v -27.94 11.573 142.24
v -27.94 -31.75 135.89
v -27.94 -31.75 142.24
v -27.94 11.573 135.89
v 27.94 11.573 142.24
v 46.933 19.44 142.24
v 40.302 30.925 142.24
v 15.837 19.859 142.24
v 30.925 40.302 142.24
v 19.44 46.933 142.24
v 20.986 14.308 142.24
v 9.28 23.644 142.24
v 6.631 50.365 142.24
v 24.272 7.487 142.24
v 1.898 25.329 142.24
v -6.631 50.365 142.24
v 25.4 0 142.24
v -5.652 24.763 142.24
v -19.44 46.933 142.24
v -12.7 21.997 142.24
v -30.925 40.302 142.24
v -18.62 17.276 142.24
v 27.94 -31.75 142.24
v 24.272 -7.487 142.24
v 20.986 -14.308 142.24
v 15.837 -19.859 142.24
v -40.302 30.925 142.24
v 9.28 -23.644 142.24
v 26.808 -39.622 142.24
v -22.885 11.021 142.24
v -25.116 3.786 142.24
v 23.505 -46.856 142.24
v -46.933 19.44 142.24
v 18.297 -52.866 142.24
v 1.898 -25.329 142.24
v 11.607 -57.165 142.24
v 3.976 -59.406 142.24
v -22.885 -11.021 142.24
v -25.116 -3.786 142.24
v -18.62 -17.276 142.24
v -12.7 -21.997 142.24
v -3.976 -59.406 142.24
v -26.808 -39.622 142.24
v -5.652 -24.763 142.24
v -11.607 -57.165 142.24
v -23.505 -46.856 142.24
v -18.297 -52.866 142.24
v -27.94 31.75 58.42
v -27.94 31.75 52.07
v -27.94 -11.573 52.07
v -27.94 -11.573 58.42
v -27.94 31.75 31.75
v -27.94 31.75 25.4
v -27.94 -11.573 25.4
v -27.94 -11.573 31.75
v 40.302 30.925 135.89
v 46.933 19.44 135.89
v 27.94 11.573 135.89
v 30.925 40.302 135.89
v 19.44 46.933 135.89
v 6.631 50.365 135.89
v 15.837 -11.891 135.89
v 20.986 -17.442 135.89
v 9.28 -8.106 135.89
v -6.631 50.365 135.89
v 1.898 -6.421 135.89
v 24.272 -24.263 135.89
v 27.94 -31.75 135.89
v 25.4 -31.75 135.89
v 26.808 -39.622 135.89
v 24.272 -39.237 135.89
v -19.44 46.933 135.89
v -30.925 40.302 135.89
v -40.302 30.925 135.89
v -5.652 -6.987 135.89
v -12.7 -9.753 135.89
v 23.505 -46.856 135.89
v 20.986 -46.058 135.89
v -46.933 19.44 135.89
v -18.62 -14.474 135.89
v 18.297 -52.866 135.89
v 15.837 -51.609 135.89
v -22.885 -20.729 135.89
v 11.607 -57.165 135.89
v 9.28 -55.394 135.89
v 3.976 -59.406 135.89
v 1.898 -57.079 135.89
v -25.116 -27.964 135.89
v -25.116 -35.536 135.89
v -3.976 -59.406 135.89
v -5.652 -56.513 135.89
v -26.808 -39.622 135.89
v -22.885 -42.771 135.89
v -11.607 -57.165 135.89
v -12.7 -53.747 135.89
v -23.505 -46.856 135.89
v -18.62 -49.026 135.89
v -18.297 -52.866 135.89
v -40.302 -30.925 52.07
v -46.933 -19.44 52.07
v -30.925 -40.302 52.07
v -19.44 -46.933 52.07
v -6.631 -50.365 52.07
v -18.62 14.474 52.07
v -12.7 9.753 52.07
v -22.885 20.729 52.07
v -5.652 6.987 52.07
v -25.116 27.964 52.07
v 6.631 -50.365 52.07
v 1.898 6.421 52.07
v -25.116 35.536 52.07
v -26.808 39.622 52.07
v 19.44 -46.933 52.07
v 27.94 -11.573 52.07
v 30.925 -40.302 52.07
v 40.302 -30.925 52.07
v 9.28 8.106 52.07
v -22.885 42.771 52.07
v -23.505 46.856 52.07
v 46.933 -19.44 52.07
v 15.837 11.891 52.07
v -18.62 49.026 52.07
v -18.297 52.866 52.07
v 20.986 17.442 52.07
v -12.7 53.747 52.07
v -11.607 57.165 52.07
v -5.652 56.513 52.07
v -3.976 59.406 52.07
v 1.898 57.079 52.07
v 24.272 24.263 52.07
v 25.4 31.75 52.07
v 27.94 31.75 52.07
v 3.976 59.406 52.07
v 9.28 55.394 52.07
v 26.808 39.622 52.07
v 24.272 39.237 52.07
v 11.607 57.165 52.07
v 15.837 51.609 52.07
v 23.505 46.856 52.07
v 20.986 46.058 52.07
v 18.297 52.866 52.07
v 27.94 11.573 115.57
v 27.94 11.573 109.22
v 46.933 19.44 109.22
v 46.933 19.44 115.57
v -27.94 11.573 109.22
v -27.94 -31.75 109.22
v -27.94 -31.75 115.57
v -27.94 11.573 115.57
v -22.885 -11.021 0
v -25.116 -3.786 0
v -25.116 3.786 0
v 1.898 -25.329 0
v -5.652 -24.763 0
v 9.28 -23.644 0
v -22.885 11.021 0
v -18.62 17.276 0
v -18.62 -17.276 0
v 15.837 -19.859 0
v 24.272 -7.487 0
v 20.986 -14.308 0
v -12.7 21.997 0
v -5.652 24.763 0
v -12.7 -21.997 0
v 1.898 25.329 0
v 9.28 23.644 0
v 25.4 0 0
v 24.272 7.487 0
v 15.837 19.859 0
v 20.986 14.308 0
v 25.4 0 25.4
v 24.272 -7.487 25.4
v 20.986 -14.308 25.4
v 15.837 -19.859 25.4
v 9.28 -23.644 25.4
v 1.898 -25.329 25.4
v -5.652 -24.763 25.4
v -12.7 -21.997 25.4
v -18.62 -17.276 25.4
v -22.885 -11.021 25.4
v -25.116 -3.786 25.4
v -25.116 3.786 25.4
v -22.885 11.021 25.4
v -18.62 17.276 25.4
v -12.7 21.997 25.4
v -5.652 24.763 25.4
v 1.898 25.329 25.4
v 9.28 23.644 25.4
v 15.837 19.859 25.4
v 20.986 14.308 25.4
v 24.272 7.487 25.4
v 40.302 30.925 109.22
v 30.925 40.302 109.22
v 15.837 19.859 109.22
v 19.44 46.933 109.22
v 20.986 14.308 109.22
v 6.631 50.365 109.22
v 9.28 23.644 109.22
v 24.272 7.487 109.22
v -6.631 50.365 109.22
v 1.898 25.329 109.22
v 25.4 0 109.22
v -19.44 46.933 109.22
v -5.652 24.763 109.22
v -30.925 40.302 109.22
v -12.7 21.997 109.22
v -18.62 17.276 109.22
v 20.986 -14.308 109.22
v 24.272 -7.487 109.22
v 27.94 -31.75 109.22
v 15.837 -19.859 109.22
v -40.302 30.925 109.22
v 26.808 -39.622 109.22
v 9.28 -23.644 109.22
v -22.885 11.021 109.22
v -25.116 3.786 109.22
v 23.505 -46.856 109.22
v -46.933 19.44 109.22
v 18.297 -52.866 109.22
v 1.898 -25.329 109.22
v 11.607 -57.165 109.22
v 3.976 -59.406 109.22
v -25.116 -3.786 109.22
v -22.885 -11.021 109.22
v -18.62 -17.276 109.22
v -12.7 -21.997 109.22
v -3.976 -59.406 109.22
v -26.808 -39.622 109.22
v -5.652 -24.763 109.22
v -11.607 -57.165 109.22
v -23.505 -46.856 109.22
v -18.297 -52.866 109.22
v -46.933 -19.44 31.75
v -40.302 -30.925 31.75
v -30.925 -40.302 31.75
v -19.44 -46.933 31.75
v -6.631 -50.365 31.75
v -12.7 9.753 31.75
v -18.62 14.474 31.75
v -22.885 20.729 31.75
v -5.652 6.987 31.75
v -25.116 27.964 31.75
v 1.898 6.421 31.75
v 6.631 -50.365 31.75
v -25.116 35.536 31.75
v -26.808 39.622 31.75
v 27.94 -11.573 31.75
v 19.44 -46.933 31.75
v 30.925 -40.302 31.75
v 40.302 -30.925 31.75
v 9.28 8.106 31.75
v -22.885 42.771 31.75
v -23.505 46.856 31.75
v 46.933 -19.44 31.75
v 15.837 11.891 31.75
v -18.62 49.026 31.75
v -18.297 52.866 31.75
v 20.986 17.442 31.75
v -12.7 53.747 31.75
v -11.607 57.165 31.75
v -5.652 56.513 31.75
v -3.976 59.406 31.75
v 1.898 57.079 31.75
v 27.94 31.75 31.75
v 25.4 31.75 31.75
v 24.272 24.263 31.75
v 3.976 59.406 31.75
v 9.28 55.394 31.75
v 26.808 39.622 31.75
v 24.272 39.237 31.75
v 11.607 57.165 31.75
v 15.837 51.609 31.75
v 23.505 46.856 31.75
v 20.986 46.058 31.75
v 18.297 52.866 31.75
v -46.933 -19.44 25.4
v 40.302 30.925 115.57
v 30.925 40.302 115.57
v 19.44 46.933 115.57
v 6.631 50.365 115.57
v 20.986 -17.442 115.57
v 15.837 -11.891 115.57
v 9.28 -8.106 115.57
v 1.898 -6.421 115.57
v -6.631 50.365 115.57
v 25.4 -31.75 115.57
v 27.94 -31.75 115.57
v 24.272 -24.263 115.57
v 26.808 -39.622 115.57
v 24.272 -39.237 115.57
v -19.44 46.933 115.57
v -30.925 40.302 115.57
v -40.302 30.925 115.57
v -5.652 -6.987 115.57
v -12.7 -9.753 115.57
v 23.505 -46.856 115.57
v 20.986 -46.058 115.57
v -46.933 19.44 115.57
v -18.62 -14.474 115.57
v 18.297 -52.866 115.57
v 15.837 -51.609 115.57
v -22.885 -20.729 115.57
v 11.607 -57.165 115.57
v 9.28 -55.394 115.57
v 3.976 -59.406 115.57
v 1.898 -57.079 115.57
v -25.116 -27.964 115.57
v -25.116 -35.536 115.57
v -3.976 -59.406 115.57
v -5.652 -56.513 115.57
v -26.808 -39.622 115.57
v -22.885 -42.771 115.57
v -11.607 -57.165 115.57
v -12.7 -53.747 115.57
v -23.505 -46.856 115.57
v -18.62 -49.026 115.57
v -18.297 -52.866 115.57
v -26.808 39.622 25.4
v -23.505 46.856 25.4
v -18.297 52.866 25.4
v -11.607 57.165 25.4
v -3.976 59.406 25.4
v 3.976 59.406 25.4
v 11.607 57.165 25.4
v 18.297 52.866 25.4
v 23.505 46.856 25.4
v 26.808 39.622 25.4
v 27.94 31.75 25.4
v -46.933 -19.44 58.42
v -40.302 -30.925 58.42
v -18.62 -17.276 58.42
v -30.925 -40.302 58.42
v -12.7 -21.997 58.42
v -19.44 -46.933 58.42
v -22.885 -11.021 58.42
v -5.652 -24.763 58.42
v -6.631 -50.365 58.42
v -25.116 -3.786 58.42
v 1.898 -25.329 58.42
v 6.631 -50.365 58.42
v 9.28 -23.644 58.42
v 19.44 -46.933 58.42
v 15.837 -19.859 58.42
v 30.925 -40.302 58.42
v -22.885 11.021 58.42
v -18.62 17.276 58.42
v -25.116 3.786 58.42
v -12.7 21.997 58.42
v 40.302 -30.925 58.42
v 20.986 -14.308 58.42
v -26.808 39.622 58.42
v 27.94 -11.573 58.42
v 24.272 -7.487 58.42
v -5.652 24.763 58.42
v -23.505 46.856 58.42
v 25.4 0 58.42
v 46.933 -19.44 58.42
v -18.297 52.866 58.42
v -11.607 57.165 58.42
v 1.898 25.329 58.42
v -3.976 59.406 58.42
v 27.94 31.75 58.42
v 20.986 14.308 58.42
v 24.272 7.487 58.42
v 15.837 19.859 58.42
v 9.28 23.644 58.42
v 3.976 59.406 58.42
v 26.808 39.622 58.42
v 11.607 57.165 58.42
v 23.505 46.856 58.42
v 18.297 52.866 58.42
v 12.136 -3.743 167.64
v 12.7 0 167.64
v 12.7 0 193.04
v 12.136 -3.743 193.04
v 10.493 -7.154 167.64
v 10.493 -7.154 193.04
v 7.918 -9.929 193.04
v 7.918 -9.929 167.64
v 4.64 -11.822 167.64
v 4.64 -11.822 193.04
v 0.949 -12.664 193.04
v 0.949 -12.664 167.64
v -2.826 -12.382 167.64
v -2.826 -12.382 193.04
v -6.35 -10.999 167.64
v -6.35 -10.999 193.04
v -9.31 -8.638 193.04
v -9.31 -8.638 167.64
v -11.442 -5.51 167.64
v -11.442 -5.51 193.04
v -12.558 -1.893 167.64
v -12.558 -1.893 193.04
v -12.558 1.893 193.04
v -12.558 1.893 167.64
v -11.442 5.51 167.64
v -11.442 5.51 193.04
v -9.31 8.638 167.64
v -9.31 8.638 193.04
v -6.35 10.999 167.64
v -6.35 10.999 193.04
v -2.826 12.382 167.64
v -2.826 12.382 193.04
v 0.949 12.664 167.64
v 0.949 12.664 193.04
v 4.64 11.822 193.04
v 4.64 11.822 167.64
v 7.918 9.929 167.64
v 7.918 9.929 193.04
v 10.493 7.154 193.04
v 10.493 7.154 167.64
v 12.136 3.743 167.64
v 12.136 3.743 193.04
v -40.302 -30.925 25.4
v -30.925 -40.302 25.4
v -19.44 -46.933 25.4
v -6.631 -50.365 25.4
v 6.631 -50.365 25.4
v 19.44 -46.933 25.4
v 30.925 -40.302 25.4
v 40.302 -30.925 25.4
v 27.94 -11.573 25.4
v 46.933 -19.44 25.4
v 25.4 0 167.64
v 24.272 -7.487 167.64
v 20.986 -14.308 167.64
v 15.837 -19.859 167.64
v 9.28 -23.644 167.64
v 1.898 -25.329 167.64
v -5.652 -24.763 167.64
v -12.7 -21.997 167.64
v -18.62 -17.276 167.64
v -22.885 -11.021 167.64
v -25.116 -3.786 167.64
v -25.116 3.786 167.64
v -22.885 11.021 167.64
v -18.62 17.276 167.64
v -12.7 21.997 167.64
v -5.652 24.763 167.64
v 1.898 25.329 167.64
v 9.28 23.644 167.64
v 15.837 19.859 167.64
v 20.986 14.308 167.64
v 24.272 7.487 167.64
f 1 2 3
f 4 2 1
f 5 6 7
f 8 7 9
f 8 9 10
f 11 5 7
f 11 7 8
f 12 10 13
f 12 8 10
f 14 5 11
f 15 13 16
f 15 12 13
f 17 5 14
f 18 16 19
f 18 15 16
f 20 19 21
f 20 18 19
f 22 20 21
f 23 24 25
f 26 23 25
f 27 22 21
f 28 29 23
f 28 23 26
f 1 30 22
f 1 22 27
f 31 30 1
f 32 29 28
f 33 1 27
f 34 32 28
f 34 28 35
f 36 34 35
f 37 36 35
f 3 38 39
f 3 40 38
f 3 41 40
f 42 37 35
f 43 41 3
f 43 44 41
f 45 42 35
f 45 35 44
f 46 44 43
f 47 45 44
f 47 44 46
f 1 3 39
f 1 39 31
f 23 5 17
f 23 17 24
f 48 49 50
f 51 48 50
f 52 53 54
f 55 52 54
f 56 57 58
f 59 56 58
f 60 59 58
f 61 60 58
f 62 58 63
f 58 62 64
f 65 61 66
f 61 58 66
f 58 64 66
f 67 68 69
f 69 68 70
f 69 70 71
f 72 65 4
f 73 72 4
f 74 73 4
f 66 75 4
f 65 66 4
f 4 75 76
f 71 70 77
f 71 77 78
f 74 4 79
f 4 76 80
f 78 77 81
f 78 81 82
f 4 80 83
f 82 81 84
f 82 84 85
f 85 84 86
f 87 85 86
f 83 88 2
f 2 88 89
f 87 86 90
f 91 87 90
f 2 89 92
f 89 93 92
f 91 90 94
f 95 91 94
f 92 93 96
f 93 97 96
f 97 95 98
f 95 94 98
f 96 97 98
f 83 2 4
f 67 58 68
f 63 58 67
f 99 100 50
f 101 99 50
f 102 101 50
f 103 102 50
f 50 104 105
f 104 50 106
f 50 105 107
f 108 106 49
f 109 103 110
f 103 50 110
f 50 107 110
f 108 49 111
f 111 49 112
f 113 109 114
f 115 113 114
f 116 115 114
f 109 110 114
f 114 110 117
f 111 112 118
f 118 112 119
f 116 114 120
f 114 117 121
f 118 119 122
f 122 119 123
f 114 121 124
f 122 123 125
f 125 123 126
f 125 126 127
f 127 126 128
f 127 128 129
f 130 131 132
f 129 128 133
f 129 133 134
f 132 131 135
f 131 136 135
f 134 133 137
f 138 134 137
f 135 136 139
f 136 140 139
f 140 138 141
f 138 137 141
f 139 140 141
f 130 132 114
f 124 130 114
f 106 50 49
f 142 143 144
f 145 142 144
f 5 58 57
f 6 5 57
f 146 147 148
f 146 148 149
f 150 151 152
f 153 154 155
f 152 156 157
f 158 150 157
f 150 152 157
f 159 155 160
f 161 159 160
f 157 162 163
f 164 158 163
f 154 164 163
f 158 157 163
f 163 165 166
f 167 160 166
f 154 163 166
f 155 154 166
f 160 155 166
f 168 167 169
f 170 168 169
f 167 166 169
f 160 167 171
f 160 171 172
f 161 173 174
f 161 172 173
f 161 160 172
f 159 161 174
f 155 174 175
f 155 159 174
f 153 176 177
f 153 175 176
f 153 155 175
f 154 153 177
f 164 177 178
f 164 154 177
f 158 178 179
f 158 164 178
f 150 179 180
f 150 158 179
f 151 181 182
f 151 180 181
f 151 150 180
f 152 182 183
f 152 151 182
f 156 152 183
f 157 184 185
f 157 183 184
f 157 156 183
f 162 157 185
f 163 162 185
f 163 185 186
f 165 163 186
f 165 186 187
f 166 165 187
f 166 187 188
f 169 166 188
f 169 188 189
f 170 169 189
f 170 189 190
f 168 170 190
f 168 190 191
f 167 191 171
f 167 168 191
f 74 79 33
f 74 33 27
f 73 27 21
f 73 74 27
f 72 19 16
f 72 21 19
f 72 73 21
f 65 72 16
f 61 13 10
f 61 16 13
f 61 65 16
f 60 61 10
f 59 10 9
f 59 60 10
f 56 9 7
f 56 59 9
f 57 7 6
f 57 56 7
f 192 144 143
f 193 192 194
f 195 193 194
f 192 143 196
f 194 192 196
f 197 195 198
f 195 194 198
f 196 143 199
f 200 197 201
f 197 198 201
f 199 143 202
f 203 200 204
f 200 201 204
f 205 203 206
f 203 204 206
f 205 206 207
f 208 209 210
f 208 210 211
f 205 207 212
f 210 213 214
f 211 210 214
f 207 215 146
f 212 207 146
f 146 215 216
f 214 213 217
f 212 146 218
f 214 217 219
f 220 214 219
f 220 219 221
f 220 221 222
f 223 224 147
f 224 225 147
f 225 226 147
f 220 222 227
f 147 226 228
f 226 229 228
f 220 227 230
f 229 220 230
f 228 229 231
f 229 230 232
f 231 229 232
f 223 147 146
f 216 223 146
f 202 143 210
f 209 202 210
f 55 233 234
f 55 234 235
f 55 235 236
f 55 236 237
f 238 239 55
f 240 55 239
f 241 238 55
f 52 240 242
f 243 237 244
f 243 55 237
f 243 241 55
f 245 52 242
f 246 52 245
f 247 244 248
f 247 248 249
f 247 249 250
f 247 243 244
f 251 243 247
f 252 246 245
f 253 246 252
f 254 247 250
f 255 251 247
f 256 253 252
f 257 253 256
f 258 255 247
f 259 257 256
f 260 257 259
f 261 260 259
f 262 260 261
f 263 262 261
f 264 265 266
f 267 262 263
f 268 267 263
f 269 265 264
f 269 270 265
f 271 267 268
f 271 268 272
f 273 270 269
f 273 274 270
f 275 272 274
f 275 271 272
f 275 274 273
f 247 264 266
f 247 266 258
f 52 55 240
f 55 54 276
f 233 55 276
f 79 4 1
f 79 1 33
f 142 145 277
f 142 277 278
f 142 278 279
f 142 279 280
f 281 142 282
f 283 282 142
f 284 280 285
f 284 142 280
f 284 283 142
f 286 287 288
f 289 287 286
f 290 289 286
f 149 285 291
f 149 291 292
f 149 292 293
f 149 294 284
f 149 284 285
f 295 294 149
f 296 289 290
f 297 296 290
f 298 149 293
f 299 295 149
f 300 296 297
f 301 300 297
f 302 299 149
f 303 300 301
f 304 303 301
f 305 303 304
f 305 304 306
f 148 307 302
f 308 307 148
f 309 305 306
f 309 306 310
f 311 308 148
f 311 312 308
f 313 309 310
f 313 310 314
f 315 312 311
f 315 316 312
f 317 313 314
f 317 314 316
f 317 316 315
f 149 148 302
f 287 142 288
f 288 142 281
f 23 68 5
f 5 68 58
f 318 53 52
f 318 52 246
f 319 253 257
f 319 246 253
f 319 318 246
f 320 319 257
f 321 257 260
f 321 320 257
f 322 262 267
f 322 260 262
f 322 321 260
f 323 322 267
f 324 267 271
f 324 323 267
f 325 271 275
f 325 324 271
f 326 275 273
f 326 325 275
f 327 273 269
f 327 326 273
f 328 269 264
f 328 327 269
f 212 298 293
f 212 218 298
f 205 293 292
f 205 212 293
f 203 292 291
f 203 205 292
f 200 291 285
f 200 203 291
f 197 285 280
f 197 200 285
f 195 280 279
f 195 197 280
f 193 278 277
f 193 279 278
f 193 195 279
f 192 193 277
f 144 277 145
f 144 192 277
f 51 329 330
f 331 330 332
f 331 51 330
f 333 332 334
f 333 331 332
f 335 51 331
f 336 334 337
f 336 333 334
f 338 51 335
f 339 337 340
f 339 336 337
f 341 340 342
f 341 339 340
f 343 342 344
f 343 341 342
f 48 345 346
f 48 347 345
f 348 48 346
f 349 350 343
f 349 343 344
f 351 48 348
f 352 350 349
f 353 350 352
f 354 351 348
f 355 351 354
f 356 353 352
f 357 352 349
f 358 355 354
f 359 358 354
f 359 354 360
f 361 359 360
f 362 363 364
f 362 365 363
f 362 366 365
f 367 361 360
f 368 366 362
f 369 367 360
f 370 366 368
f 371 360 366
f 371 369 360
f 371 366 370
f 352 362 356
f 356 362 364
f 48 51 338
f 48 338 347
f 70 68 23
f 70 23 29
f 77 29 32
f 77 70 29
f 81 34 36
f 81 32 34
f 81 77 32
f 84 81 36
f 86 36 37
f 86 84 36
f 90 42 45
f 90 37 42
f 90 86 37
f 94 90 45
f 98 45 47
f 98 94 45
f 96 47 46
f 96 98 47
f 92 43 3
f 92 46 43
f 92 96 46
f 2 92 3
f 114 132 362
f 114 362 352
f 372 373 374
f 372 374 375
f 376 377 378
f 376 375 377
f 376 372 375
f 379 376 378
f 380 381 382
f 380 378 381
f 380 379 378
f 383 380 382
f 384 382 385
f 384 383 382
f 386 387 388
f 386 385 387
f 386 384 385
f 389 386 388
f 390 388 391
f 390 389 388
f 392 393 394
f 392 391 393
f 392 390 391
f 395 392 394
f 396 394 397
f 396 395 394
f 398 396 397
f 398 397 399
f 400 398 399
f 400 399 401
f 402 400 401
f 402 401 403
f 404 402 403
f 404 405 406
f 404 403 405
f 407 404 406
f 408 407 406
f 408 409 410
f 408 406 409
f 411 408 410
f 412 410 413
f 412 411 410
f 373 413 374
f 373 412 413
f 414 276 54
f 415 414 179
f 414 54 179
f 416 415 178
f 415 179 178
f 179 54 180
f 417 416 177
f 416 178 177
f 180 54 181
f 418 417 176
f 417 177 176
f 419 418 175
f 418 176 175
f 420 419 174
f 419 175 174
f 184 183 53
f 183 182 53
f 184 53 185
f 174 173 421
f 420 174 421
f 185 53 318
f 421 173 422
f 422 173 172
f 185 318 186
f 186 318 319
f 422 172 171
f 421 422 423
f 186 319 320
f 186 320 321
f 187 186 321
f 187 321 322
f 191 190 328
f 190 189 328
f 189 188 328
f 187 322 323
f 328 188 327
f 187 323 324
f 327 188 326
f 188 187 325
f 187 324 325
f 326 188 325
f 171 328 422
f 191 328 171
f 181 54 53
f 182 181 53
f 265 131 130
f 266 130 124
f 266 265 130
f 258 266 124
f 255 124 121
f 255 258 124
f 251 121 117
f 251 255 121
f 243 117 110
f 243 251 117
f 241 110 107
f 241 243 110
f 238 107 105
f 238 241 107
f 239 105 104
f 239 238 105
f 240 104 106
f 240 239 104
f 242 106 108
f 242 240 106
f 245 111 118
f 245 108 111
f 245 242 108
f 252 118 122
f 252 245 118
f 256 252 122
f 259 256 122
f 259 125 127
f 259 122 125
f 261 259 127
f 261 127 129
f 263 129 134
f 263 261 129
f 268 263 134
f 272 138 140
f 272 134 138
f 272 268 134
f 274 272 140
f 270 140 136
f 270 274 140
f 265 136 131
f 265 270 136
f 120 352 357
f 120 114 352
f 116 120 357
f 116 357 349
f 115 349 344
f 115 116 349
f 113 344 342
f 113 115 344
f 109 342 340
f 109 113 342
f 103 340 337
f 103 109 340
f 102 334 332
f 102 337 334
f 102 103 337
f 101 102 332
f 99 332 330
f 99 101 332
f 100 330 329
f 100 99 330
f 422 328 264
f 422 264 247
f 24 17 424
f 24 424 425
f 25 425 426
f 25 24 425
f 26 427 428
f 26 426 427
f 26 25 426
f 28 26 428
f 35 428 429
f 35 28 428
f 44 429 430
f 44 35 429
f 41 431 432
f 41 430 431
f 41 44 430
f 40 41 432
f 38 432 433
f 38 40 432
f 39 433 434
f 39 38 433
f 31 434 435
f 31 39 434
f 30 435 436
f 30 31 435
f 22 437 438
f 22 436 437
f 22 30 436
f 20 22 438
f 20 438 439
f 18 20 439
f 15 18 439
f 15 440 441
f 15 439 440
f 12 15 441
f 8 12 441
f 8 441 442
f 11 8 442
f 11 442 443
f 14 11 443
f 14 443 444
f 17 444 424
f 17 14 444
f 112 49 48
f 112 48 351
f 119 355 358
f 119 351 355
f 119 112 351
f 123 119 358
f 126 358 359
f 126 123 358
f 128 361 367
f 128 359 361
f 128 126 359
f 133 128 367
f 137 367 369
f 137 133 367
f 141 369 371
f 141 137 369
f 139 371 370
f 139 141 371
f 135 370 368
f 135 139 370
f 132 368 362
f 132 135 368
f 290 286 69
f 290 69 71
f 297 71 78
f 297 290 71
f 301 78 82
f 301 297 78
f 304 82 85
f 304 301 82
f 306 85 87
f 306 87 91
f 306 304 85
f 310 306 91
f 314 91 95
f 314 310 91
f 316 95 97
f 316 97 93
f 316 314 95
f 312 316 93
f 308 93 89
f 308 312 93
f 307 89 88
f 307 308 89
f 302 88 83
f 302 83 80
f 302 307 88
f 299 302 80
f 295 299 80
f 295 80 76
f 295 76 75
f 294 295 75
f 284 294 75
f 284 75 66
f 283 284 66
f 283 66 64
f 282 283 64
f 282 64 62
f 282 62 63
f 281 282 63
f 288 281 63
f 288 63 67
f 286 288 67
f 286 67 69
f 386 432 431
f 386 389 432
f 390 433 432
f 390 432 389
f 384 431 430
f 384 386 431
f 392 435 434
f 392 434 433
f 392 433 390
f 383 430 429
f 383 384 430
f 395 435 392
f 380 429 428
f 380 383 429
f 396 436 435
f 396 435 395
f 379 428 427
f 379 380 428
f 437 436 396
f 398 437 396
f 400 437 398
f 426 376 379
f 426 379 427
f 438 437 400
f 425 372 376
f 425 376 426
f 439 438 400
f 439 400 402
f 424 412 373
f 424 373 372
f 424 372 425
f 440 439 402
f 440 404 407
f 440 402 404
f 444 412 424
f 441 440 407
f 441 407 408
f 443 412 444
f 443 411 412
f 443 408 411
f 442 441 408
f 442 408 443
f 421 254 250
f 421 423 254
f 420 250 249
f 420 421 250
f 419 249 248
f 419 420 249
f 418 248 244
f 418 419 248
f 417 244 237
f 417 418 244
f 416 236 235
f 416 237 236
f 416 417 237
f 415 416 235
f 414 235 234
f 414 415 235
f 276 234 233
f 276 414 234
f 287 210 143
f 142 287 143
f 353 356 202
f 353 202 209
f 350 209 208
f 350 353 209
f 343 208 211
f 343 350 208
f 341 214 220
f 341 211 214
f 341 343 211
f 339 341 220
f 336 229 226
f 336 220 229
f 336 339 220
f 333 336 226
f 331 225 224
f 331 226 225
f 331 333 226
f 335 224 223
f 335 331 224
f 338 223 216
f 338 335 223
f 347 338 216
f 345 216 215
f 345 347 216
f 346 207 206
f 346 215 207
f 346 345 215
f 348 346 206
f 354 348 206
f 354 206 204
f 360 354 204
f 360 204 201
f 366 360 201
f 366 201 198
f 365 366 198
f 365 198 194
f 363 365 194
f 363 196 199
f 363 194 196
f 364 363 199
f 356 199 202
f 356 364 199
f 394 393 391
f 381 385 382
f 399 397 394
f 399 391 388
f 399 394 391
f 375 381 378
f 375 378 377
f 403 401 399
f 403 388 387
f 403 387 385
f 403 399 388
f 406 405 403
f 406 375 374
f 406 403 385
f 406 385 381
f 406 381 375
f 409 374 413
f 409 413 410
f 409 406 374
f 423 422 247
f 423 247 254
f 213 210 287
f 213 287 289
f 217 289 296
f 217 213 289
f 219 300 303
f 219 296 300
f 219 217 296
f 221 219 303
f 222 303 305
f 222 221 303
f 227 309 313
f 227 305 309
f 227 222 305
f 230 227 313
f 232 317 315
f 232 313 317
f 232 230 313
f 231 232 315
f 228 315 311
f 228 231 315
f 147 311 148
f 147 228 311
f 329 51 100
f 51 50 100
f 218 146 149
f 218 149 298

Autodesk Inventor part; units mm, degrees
ref_plane "YZ Plane" through (0, 0, 0) normal (1, 0, 0) x (0, 1, 0)
ref_plane "XZ Plane" through (0, 0, 0) normal (0, 1, 0) x (-1, 0, 0)
ref_plane "XY Plane" through (0, 0, 0) normal (0, 0, 1) x (1, 0, 0)
sketch "Sketch1" plane through (0, 0, 0) normal (0, 0, 1) x (1, 0, 0)
  circle A0 centre (0, 0) radius 25.4
  dimension "d0" = 50.8
extrude "Extrusion1" add sketch "Sketch1" along normal blind 25.4
sketch "Sketch2" plane through (0, 0, 25.4) normal (0, 0, 1) x (1, 0, 0)
  arc A0 (27.94, 31.75) -> (-27.94, 31.75) centre (0, 31.75) ccw
  arc A1 (-46.9331, -19.4403) -> (46.9331, -19.4403) centre (0, 0) ccw
  line L0 (-27.94, 31.75) -> (-27.94, -11.5731)
  line L1 (-27.94, -11.5731) -> (-46.9331, -19.4403)
  line L2 (27.94, 31.75) -> (27.94, -11.5731)
  line L3 (27.94, -11.5731) -> (46.9331, -19.4403)
  circle A2 centre (0, 0) radius 25.4 projected
  dimension "d3" = 31.75
  dimension "d4" = 50.8
  dimension "d5" = 27.94
  dimension "d6" = 135
extrude "Extrusion2" add sketch "Sketch2" along normal blind 6.35 contours L2 L3 A1 L1 L0 A0 | A2
sketch "Sketch3" plane through (0, 0, 31.75) normal (0, 0, 1) x (1, 0, 0)
  circle A0 centre (0, 31.75) radius 25.4
  arc A1 (27.94, 31.75) -> (-27.94, 31.75) centre (0, 31.75) ccw projected
  point P0 (0, 0)
  dimension "d9" = 50.8
extrude "Extrusion3" add sketch "Sketch3" along normal blind 20.32
pattern_linear "Rectangular Pattern1" count 2 spacing 26.67 along (0, 0, 1) of "Extrusion2"
sketch "Sketch4" plane through (0, 0, 58.42) normal (0, 0, 1) x (1, 0, 0)
  circle A0 centre (0, 0) radius 25.4
  dimension "d15" = 50.8
extrude "Extrusion4" add sketch "Sketch4" along normal blind 50.8
sketch "Sketch5" plane through (0, 4.445, 109.22) normal (0, 0, 1) x (-1, 0, 0)
  arc A0 (27.94, 36.195) -> (-27.94, 36.195) centre (0, 36.195) ccw
  arc A1 (-46.9331, -14.9953) -> (46.9331, -14.9953) centre (0, 4.445) ccw
  line L0 (-27.94, 36.195) -> (-27.94, -7.1281)
  line L1 (-27.94, -7.1281) -> (-46.9331, -14.9953)
  line L2 (27.94, 36.195) -> (27.94, -7.1281)
  line L3 (27.94, -7.1281) -> (46.9331, -14.9953)
  circle A2 centre (0, 4.445) radius 25.4 projected
  point P0 (0, 4.445)
  dimension "d19" = 50.8
  dimension "d20" = 27.94
  dimension "d18" = 135
  dimension "d25" = 31.75
extrude "Extrusion5" add sketch "Sketch5" along normal blind 6.35 contours L2 L3 A1 L1 L0 A0 | A2
sketch "Sketch6" plane through (0, 4.445, 115.57) normal (0, 0, 1) x (1, 0, 0)
  circle A0 centre (0, -36.195) radius 25.4
  arc A1 (-27.94, -36.195) -> (27.94, -36.195) centre (0, -36.195) ccw projected
  point P0 (0, -4.445)
  dimension "d26" = 50.8
extrude "Extrusion6" add sketch "Sketch6" along normal blind 25.4
pattern_linear "Rectangular Pattern2" count 2 spacing 26.67 along (0, 0, 1) of "Extrusion5"
sketch "Sketch7" plane through (0, 0, 142.24) normal (0, 0, 1) x (1, 0, 0)
  circle A0 centre (0, 0) radius 25.4
  dimension "d32" = 50.8
extrude "Extrusion7" add sketch "Sketch7" along normal blind 25.4
sketch "Sketch8" plane through (0, 0, 167.64) normal (0, 0, 1) x (1, 0, 0)
  circle A0 centre (0, 0) radius 12.7
  dimension "d35" = 25.4
extrude "Extrusion8" add sketch "Sketch8" along normal blind 25.4
properties part number "crankshaft"
